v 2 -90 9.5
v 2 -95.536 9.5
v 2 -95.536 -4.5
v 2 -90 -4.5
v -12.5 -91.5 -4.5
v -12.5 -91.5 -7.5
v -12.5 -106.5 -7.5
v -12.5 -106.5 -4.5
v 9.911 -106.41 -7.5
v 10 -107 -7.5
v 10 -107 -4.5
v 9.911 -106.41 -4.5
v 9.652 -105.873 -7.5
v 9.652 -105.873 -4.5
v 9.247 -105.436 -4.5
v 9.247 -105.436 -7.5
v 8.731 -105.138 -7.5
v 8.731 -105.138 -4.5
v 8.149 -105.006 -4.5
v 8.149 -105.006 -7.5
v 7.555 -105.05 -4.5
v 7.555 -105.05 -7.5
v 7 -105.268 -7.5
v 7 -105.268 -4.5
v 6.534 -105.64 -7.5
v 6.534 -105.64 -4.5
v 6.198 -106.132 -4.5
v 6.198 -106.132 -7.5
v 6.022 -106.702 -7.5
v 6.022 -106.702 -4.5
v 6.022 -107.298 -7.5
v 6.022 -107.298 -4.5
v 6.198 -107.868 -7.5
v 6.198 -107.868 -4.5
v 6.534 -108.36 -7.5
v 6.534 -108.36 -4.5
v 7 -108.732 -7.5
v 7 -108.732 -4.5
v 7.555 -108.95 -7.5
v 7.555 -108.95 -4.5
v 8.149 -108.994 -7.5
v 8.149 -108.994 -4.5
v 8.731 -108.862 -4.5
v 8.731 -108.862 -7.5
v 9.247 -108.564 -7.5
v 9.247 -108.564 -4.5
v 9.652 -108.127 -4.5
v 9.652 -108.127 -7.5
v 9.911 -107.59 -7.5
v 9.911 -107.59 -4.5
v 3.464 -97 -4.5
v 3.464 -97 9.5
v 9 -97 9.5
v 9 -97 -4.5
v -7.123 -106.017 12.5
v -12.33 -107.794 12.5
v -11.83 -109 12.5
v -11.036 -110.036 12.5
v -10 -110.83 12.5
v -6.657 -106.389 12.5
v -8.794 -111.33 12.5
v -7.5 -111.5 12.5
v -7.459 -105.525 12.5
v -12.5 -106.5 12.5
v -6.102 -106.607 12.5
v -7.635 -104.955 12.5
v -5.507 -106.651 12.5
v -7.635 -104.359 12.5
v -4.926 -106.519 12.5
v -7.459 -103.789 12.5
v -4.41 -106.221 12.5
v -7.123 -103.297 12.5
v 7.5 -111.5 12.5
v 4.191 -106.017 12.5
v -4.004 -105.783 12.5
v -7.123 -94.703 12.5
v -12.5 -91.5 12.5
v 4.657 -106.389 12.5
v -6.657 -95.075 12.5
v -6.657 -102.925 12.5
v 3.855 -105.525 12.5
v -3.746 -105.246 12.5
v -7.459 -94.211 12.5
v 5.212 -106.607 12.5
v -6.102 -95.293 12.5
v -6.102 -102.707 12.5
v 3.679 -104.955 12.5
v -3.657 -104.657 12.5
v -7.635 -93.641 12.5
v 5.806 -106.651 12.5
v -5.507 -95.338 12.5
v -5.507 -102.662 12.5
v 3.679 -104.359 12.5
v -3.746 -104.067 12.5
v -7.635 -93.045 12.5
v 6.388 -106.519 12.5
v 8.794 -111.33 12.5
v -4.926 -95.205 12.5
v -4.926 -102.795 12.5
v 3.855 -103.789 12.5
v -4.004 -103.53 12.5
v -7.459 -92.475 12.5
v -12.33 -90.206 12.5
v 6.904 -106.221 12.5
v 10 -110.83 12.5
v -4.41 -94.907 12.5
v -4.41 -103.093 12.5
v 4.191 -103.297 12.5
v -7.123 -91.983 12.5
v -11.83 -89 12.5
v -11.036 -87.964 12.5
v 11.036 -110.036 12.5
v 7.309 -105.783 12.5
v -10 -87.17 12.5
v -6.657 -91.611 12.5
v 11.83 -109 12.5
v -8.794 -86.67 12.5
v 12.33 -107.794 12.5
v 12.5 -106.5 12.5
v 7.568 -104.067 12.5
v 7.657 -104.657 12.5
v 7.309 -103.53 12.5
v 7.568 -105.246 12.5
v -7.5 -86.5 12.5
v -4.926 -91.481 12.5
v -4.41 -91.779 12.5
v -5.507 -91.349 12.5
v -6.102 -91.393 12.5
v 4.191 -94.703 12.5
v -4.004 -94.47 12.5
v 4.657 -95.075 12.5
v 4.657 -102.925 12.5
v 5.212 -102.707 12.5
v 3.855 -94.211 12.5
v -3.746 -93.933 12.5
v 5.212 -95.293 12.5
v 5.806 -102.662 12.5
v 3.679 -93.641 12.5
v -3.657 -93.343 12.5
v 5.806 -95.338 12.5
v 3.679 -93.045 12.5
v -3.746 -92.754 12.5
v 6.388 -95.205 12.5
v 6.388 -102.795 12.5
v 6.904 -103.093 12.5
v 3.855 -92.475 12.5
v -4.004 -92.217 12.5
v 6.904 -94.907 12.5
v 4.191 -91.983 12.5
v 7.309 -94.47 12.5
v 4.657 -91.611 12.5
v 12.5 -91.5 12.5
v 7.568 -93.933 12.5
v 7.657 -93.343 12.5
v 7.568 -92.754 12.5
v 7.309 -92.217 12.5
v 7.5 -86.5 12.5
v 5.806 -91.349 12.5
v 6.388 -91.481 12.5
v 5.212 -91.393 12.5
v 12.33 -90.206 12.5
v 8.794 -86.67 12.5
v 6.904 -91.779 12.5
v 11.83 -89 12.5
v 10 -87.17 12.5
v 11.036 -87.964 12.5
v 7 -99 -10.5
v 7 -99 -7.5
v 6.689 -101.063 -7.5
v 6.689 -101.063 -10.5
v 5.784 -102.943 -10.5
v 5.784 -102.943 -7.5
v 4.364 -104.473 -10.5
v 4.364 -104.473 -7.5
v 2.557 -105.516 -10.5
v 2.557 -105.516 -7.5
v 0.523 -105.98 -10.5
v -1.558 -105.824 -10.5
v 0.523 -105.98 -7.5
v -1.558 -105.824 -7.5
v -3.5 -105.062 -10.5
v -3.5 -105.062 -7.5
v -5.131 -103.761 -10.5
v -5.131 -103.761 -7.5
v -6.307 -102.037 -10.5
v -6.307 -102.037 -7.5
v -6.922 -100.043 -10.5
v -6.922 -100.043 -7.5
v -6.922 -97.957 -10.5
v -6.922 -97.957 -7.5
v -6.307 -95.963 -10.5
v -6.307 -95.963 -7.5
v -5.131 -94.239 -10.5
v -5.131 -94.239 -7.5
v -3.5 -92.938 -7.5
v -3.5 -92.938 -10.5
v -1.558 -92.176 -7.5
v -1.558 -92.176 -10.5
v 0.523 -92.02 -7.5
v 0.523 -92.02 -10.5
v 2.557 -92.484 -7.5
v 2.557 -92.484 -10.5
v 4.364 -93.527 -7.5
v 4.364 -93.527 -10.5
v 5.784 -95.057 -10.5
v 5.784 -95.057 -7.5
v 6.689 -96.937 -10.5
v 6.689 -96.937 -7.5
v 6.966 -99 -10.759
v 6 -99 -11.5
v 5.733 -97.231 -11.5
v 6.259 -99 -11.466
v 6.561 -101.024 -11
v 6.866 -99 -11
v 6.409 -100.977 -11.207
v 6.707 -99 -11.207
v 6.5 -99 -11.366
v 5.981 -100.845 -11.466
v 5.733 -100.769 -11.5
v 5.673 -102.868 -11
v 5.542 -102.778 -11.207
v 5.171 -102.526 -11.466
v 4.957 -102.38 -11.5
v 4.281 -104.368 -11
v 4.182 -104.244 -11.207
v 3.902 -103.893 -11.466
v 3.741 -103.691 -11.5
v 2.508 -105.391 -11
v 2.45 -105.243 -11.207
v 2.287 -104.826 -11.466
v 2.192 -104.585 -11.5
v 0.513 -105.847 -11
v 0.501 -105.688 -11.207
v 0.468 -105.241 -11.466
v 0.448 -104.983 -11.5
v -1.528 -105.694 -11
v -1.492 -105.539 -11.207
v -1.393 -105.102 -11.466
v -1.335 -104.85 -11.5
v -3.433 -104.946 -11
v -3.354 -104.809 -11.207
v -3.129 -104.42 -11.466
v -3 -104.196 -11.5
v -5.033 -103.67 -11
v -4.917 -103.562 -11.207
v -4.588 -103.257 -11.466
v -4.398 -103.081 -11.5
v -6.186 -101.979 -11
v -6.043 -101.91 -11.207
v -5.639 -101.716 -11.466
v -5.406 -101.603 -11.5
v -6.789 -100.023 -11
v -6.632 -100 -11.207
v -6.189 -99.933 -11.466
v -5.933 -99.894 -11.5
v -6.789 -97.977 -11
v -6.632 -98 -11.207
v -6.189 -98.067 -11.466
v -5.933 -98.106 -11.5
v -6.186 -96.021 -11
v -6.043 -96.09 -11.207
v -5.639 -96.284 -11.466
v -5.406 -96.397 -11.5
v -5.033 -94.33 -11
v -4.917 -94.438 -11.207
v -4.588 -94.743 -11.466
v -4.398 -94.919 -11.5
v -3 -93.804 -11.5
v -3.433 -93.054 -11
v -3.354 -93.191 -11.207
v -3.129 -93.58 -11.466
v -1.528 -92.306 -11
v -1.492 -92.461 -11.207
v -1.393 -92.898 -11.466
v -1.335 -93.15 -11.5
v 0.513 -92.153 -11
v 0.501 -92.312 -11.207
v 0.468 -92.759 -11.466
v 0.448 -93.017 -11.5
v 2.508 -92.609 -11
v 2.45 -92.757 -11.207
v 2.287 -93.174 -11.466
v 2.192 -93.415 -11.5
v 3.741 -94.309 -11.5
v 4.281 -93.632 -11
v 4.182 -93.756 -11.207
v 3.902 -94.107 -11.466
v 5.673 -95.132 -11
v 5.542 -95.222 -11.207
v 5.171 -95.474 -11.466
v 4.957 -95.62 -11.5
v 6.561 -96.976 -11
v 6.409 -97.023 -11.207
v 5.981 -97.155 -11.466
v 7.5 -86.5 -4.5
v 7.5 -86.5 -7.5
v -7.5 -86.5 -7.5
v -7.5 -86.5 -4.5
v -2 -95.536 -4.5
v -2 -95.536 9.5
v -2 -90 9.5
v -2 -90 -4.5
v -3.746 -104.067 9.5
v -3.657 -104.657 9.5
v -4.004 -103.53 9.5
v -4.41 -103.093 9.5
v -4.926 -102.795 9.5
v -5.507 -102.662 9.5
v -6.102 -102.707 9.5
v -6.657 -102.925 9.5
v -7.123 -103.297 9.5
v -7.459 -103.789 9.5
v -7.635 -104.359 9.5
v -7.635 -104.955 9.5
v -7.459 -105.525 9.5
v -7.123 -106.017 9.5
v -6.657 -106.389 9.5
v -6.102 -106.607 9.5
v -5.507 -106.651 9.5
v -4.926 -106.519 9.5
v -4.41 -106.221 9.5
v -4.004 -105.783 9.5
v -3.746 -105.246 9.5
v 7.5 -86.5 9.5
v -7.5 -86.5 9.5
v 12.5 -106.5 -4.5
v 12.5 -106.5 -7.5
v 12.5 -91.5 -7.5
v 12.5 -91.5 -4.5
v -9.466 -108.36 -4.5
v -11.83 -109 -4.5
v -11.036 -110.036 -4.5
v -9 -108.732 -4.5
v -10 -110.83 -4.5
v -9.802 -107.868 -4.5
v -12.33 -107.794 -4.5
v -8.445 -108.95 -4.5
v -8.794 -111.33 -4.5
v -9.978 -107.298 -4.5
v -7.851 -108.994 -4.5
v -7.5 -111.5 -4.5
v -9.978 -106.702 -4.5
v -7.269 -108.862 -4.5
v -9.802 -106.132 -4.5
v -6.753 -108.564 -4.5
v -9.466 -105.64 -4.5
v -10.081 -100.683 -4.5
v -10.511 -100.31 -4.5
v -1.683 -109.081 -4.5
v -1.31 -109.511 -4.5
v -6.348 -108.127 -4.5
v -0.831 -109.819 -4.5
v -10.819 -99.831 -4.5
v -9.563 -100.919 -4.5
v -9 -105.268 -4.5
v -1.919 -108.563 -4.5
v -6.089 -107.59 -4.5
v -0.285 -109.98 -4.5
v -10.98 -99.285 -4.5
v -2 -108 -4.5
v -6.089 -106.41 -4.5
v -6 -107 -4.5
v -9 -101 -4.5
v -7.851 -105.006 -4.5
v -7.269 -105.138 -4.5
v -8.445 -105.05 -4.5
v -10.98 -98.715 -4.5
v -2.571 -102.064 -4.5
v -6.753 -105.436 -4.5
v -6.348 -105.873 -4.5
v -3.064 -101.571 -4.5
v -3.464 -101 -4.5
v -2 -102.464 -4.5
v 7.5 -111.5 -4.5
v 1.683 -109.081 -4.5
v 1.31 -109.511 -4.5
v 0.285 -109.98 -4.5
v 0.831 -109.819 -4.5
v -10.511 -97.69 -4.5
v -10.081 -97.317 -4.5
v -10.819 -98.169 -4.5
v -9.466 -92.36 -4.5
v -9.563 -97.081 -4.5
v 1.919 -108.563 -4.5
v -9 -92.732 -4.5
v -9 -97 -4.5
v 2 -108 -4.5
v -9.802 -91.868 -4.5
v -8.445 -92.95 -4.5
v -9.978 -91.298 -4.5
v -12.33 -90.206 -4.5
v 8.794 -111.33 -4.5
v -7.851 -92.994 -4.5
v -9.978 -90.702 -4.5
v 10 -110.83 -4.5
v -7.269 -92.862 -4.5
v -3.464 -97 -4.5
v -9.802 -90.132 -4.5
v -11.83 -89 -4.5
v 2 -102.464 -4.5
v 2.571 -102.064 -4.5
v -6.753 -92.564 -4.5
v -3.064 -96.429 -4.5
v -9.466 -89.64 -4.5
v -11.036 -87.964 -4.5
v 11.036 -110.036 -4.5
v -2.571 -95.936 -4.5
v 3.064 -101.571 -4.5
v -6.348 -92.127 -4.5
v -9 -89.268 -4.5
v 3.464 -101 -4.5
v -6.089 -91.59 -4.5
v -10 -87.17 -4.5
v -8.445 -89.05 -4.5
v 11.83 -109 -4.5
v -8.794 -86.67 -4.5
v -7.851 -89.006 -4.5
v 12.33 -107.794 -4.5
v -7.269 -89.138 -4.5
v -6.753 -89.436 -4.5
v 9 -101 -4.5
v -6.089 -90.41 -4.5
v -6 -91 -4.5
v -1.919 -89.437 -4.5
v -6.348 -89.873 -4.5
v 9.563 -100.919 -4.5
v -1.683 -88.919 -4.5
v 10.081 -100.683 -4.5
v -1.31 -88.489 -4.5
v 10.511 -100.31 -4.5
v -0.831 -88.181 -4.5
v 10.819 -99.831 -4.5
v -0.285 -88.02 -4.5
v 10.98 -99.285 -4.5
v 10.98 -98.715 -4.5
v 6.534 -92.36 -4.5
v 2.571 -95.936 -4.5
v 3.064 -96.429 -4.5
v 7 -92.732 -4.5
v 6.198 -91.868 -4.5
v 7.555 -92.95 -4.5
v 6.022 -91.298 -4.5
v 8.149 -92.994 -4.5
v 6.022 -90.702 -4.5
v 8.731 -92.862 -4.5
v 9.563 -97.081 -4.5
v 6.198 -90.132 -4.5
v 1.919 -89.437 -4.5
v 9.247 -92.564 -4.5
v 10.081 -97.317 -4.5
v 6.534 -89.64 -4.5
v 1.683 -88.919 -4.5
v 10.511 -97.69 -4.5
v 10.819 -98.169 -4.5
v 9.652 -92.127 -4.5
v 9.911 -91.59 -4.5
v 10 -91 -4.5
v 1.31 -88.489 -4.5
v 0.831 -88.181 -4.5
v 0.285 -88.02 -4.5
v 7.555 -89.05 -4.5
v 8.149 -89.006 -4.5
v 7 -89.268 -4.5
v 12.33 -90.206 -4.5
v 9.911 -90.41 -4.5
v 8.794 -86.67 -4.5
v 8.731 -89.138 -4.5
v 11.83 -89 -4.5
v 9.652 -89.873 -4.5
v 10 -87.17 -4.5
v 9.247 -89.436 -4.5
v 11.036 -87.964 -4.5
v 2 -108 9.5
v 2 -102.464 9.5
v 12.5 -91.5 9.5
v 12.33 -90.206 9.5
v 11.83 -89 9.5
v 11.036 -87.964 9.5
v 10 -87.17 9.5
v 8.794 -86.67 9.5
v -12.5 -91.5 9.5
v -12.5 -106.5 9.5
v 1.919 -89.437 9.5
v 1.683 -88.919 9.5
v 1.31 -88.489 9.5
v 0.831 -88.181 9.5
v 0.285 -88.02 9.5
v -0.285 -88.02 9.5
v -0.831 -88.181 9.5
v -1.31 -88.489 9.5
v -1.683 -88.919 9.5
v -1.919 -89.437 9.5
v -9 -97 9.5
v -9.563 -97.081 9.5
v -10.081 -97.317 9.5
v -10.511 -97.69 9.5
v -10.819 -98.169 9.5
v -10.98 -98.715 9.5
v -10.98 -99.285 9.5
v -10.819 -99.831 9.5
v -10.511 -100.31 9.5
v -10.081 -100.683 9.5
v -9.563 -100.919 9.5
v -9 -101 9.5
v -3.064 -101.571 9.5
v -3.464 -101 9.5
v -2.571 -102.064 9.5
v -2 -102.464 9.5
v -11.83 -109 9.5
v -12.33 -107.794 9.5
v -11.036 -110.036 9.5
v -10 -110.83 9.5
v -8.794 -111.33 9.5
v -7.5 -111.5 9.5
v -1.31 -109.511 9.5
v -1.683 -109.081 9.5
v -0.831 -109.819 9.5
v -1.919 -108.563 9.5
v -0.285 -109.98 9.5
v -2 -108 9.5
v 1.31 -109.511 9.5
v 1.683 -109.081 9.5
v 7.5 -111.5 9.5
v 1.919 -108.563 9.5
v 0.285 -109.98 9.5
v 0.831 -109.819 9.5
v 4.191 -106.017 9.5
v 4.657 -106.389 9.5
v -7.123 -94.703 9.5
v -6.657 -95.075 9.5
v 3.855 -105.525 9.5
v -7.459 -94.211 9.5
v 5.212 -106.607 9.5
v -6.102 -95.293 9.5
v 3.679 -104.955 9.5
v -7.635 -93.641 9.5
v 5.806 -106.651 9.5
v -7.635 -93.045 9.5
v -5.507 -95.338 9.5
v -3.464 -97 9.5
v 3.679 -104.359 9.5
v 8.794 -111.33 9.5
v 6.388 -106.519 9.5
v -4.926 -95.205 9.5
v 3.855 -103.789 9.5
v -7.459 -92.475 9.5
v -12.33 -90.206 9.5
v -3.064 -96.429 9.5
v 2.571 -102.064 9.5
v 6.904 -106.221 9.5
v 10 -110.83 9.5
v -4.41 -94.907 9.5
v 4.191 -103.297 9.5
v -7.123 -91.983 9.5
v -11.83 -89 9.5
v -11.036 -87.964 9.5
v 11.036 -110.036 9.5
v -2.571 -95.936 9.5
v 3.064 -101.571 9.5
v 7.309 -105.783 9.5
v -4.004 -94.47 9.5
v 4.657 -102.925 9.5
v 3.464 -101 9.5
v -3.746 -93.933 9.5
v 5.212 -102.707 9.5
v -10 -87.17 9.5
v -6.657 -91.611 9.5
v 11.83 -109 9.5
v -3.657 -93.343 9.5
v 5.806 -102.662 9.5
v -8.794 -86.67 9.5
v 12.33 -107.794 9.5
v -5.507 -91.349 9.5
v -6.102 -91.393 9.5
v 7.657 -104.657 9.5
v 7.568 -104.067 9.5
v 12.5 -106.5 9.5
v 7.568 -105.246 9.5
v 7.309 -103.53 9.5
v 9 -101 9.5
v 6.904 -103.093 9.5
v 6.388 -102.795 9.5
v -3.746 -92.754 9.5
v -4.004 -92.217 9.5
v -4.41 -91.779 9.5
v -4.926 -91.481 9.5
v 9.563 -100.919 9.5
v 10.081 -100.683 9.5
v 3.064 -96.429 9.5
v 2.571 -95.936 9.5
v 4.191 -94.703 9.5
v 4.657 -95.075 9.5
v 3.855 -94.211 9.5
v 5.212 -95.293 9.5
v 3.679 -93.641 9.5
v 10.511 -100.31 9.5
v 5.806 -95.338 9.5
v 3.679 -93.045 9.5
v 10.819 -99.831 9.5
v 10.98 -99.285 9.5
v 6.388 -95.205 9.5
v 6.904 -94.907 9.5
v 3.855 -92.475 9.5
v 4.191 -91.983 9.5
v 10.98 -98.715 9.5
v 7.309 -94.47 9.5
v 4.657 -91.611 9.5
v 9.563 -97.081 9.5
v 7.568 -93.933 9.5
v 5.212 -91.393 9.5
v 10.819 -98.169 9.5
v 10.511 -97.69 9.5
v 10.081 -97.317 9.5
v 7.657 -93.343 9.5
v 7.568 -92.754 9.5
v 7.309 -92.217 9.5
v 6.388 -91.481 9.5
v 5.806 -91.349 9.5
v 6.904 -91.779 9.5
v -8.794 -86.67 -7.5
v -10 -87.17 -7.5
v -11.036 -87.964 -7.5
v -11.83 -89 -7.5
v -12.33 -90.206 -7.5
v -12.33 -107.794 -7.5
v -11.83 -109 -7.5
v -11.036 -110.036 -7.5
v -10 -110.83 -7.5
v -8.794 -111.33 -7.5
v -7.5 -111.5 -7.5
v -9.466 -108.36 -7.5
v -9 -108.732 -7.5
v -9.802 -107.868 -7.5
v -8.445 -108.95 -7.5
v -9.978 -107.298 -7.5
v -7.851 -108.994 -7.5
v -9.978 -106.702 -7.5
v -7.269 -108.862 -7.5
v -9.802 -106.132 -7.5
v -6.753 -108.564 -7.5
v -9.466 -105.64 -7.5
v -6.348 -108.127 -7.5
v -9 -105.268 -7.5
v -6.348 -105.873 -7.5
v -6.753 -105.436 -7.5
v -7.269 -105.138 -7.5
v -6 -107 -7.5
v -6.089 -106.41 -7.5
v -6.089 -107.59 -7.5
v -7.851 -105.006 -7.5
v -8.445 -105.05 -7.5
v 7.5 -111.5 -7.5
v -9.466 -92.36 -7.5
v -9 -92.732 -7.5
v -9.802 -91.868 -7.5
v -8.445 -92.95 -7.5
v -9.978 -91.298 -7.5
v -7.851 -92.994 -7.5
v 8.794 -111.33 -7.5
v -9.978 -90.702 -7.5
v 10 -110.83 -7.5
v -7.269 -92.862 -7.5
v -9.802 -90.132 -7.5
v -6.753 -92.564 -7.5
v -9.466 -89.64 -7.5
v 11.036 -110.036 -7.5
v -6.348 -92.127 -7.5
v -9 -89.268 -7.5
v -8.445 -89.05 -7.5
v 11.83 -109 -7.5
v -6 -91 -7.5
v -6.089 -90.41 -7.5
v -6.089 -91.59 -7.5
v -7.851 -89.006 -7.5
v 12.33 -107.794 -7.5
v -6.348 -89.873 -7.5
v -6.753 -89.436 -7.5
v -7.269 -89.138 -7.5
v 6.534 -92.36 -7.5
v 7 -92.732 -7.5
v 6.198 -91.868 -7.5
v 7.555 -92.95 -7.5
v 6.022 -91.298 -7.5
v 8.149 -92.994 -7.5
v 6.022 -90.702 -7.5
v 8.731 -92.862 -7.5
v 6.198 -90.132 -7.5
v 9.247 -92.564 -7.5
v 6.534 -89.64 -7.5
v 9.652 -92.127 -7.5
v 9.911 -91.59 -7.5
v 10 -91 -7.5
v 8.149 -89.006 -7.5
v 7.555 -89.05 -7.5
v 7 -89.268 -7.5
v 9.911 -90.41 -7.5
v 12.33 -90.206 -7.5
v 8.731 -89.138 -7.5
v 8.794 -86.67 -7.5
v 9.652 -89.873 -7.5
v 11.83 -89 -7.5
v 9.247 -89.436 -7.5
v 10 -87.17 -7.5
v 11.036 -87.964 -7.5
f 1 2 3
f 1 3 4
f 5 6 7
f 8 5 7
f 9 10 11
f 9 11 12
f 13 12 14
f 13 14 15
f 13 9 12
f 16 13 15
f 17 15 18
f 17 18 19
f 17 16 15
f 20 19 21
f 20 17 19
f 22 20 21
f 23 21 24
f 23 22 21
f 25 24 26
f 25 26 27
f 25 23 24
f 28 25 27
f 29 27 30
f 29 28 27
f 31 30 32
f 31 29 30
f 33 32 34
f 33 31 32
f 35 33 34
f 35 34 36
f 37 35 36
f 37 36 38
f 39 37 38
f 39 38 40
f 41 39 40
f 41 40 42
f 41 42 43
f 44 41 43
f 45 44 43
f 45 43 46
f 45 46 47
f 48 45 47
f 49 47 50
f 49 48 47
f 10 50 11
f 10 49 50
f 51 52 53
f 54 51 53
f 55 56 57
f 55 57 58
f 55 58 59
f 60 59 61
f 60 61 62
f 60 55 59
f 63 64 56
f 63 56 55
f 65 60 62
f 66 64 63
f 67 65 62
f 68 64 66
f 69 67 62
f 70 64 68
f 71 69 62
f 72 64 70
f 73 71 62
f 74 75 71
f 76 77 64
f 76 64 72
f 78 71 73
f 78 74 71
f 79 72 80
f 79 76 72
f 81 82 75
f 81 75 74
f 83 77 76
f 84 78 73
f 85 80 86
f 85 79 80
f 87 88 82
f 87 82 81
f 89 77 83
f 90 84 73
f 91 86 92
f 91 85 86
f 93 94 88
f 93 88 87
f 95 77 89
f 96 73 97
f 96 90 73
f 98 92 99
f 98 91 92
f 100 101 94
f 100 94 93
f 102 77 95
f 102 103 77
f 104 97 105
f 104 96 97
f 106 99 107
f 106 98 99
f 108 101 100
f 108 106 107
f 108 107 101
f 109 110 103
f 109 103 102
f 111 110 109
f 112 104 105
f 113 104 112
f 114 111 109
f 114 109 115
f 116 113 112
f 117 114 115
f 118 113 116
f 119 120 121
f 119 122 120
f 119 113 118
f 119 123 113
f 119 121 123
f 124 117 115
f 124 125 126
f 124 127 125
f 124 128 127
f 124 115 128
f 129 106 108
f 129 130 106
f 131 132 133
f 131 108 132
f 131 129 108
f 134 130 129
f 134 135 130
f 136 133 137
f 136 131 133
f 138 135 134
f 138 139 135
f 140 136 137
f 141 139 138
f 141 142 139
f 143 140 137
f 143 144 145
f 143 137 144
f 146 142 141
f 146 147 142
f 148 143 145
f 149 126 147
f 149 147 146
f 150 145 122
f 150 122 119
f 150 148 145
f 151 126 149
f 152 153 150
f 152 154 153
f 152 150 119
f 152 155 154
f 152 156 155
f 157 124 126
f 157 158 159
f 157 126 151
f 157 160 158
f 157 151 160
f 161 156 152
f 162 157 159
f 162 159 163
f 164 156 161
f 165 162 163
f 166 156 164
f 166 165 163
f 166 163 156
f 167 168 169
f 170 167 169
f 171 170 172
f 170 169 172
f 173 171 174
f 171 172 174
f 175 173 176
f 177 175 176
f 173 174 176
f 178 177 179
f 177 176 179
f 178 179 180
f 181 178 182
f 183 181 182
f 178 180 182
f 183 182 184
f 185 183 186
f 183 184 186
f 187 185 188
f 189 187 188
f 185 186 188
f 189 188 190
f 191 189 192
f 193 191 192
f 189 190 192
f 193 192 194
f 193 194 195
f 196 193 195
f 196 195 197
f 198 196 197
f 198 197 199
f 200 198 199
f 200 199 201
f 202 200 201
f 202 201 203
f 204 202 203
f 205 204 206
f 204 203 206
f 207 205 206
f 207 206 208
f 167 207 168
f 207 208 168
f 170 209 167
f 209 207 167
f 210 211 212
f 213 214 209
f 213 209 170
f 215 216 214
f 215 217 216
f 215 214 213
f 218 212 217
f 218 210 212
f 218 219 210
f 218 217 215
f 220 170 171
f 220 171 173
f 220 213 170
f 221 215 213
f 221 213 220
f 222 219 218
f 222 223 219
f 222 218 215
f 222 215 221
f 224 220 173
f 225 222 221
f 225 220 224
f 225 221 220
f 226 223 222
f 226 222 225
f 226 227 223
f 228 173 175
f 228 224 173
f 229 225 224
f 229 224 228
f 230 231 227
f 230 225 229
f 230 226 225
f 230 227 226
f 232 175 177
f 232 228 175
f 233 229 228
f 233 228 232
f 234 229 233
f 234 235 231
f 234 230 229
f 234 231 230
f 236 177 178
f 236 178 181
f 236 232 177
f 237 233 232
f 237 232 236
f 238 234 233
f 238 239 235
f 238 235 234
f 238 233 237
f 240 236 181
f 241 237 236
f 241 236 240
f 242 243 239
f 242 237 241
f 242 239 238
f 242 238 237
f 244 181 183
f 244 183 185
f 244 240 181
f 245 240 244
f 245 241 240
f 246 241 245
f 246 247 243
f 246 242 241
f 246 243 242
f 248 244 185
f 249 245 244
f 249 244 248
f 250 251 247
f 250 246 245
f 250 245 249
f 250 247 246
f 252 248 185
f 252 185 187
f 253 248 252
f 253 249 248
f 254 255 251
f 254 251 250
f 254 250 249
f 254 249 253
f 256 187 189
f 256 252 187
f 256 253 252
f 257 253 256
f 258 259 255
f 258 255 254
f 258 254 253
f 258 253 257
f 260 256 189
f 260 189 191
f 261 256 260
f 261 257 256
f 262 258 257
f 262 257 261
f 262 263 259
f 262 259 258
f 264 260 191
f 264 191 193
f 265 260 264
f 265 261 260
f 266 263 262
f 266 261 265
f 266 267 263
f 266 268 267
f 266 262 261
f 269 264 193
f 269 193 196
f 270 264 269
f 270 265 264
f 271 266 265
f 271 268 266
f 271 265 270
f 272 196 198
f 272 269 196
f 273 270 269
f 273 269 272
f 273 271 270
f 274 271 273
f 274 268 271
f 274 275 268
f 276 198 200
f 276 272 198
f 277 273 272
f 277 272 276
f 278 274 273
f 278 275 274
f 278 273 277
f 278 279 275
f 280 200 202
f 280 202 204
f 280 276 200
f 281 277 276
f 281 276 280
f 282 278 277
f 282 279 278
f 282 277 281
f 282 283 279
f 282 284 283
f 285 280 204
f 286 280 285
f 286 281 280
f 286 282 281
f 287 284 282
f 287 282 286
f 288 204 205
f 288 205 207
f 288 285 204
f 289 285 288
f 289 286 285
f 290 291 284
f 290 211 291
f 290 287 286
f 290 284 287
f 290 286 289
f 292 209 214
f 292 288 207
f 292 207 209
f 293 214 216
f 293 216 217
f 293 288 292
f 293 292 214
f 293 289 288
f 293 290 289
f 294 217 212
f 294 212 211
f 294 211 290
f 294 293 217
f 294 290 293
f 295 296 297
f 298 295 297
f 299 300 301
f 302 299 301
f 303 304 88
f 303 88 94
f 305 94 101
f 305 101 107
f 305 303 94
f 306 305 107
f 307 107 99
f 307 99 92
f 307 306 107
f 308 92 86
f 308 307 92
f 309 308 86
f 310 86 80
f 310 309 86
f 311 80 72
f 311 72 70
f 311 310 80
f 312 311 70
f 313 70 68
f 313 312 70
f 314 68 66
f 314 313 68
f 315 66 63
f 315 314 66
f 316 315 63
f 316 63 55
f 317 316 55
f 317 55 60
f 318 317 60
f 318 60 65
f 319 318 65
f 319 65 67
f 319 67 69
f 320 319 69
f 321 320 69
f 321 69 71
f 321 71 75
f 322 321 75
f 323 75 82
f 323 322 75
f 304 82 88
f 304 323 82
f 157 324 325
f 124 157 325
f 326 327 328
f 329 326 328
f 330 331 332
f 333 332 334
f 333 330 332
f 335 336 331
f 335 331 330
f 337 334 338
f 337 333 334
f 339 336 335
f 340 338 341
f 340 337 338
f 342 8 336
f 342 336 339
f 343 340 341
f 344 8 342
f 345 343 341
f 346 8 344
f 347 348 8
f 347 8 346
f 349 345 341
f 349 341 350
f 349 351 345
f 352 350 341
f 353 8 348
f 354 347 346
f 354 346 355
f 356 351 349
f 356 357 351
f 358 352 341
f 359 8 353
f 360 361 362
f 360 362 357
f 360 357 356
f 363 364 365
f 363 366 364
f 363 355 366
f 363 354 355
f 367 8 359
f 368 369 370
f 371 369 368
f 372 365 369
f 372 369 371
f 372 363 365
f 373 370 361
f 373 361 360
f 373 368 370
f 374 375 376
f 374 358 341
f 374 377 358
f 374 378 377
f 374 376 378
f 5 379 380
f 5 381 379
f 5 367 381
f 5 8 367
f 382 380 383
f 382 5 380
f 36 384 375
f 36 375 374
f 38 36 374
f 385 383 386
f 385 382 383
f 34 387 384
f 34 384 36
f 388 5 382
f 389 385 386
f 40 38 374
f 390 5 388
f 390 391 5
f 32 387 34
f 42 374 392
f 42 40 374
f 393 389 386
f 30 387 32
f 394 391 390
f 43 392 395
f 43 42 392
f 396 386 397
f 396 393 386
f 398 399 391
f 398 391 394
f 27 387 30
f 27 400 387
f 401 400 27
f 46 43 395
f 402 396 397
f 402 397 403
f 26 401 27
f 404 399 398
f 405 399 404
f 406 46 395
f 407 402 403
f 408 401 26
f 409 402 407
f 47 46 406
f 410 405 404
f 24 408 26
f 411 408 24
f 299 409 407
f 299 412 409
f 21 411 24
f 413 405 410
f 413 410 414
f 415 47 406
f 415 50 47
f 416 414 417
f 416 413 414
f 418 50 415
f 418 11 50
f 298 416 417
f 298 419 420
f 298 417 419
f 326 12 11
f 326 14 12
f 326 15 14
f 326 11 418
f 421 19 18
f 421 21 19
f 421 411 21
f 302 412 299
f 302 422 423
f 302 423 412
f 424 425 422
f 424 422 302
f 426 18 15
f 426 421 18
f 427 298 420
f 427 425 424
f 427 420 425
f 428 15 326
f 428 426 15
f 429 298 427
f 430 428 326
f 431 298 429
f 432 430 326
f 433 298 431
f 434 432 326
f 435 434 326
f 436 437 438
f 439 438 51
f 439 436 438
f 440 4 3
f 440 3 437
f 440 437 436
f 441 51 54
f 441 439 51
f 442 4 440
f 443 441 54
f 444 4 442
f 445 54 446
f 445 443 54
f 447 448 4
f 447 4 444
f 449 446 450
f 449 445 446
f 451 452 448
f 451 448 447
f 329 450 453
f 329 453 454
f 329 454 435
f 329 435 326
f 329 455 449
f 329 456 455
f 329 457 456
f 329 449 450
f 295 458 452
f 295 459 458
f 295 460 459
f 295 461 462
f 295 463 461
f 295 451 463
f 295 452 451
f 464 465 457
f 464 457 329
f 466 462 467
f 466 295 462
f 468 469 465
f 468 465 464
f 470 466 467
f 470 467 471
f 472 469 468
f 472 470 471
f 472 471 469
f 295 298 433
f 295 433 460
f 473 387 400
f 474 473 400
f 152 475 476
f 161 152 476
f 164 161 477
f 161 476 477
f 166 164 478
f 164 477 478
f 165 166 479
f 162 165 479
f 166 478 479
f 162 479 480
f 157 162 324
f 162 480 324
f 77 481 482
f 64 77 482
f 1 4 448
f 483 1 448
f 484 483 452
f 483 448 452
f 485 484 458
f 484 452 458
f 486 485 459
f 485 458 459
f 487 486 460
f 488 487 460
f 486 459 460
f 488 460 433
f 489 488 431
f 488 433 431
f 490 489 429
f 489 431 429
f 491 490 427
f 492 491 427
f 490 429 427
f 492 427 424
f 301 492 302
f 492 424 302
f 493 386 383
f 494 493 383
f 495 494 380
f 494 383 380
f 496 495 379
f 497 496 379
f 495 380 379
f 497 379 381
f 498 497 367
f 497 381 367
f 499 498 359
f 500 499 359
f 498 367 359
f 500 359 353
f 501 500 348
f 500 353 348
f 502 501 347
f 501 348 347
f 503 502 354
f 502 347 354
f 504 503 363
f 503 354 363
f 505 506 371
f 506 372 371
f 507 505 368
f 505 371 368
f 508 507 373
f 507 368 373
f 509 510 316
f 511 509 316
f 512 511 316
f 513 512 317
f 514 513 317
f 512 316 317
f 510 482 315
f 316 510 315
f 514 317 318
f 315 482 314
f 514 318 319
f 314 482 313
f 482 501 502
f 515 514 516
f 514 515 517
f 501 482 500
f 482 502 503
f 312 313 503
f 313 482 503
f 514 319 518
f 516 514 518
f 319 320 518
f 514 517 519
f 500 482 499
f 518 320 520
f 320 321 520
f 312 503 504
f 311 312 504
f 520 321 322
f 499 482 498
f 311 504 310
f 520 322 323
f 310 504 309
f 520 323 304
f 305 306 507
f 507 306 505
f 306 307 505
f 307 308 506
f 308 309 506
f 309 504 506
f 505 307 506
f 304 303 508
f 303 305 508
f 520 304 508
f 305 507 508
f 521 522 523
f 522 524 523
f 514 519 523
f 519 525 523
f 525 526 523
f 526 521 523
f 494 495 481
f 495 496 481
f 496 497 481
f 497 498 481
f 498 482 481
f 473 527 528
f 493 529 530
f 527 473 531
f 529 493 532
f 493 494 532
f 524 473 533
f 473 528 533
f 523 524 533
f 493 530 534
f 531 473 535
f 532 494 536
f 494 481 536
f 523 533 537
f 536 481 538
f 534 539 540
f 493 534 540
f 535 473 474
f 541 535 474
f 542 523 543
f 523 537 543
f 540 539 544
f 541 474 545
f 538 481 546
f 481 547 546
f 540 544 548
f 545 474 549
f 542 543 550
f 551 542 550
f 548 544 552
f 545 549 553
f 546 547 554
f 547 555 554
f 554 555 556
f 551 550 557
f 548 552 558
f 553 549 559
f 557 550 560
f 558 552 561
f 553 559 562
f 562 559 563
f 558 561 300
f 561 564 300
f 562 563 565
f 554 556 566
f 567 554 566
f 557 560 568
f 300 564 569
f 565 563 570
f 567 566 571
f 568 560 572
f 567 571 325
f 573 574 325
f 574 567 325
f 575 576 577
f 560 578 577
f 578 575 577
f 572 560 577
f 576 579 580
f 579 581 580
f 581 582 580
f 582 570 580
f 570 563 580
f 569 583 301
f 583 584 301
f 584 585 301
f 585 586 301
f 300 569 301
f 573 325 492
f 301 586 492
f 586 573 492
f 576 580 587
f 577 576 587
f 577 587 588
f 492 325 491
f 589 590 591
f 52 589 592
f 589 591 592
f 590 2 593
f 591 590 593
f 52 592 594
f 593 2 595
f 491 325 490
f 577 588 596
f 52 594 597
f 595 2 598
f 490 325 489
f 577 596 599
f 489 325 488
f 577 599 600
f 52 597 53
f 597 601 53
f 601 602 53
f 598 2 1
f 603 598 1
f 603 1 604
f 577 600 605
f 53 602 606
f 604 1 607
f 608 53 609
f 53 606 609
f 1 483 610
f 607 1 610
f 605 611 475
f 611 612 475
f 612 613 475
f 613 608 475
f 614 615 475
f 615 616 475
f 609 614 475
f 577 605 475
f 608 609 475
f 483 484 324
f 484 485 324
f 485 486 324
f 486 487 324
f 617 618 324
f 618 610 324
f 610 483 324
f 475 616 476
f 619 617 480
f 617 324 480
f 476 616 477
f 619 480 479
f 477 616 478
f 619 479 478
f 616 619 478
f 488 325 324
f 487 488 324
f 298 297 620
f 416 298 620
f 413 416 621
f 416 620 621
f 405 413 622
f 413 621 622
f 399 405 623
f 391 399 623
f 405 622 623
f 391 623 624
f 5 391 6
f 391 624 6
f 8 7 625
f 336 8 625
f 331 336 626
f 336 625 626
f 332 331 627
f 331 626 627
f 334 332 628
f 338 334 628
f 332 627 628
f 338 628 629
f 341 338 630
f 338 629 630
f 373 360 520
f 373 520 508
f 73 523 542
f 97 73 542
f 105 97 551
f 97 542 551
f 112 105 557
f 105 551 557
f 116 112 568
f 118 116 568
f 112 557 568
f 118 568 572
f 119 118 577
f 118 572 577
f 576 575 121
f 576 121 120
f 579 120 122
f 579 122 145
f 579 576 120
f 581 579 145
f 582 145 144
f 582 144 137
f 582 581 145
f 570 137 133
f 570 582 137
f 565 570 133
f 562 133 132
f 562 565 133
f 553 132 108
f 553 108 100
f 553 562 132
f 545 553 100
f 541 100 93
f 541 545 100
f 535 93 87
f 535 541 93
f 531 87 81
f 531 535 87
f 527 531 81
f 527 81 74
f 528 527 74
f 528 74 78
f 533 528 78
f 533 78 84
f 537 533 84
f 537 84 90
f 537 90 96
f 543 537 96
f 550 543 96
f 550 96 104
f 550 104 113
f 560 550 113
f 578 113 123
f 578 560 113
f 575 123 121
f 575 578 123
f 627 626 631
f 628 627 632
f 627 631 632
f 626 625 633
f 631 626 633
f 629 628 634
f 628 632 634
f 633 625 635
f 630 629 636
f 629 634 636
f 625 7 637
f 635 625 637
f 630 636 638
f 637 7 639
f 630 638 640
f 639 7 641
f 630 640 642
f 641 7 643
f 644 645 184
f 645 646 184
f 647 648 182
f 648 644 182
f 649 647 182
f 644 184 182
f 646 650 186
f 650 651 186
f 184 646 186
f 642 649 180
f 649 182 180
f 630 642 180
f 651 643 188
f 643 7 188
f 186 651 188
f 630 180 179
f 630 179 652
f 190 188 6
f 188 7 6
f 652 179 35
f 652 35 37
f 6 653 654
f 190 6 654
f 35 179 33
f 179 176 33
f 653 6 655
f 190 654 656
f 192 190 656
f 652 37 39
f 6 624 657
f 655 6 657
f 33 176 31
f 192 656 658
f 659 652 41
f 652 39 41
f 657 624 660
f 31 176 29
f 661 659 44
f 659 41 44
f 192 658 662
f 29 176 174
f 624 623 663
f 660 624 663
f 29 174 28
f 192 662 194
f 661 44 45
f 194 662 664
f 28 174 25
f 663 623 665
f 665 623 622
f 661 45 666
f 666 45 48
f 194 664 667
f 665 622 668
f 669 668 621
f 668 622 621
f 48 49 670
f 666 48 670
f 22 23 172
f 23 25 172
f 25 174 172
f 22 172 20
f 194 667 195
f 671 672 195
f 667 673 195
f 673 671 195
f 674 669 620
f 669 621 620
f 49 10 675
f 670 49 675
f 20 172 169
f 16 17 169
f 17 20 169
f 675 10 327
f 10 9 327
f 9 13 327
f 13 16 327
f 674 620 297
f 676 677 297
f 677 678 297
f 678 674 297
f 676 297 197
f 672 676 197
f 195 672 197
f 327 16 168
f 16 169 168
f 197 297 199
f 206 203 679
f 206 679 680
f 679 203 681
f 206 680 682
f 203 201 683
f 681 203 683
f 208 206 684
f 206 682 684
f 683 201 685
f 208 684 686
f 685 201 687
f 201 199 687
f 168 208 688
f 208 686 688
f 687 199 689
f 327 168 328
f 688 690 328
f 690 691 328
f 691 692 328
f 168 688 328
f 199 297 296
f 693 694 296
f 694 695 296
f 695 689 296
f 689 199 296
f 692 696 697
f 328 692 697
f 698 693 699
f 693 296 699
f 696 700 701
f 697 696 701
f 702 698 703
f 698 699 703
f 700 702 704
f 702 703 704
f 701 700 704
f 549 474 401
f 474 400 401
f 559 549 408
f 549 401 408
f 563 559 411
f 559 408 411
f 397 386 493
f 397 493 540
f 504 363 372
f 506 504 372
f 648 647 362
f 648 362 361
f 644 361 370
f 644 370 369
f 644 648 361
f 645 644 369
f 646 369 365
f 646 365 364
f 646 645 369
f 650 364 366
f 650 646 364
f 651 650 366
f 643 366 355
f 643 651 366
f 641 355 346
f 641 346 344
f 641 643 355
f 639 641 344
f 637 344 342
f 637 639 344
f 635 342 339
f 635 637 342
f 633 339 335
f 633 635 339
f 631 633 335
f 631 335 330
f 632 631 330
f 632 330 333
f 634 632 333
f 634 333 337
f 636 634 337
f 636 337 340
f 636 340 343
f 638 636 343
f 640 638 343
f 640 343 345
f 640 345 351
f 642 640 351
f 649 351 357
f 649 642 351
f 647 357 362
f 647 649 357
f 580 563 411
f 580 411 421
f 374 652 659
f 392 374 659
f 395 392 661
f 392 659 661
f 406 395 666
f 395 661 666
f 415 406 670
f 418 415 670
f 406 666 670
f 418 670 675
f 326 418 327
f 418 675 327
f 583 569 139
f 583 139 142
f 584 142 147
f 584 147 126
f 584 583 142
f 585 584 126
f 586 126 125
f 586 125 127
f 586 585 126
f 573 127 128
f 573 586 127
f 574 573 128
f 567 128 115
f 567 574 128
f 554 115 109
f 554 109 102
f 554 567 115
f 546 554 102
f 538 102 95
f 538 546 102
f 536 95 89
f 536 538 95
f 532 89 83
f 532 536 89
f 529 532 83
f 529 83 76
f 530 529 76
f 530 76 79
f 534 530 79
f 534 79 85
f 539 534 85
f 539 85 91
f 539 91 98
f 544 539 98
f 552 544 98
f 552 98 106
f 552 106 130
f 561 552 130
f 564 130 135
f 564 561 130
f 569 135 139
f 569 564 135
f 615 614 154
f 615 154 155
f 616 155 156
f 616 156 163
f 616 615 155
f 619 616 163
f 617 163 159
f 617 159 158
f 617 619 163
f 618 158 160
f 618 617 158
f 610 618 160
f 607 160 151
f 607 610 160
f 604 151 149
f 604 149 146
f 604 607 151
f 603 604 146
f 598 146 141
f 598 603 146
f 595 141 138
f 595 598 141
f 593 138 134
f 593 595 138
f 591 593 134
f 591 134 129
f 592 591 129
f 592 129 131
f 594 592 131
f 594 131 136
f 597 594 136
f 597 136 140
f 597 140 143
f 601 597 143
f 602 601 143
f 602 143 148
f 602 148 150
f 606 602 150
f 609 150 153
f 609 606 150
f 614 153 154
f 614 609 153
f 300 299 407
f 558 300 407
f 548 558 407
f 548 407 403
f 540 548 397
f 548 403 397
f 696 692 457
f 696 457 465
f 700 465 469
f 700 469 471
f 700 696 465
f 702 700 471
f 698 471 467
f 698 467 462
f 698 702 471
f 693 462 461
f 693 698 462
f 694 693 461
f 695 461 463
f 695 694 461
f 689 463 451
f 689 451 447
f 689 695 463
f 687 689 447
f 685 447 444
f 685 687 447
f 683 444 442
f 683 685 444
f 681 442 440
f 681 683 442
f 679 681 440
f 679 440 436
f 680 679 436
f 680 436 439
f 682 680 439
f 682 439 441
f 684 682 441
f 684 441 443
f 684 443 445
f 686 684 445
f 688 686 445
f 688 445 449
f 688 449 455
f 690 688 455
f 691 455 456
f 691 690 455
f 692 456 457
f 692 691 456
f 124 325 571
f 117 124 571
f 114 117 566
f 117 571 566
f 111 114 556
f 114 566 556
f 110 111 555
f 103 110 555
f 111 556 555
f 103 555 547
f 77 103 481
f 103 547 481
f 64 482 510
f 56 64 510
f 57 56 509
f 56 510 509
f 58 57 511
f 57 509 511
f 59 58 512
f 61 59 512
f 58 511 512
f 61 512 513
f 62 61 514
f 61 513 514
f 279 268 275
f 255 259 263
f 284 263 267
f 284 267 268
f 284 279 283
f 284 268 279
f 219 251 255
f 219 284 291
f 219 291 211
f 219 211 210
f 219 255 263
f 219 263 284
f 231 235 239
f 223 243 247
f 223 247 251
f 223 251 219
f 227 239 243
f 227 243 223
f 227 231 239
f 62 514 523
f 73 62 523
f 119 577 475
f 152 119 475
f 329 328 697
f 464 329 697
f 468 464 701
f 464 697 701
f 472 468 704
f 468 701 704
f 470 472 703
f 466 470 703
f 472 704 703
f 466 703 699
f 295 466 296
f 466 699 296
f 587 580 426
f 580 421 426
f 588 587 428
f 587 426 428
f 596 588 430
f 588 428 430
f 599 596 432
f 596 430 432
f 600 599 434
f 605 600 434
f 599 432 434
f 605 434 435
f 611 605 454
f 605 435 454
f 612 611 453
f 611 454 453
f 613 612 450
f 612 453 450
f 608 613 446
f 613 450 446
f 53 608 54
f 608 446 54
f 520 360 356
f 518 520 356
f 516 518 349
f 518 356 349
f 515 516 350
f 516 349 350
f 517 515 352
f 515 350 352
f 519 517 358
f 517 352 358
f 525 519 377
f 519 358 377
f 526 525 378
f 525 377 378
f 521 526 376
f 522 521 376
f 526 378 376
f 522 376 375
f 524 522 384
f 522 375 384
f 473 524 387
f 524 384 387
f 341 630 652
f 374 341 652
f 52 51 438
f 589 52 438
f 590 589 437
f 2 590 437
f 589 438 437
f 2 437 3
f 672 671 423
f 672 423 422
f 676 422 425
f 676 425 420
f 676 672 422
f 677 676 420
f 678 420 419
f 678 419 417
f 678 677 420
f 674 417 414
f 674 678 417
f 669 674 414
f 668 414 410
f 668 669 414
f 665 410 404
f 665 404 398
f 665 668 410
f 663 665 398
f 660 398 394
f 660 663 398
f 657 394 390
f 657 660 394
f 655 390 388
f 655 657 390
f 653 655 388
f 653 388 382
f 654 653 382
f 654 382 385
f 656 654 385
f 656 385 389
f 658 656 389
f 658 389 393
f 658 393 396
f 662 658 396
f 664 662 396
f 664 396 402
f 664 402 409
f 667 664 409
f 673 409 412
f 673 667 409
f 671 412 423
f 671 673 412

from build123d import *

# Parameters (mm, degrees)
SKETCH028_R   = 2
PAD018_DEPTH  = 3
SKETCH005_R   = 7
PAD003_DEPTH  = 4
FILLET_R      = 1
SKETCH029_R   = 4
SKETCH029_R_2 = 2
PAD019_DEPTH  = 14
SKETCH030_R   = 2
PAD020_DEPTH  = 3
SKETCH031_W   = 18
SKETCH031_H   = 4
PAD021_DEPTH  = 14
SKETCH032_W   = 4
SKETCH032_H   = 18
PAD022_DEPTH  = 14


with BuildPart() as part:
    # Sketch028 (on Face1 of CopySolid004) → Pad018 (new body)
    with BuildSketch(Plane.XY.offset(-16)):
        with BuildLine():
            Line((-7.5, -12.5), (7.5, -12.5))
            ThreePointArc((7.5, -12.5), (11.035534, -11.035534), (12.5, -7.5))
            Line((12.5, -7.5), (12.5, 7.5))
            ThreePointArc((12.5, 7.5), (11.035534, 11.035534), (7.5, 12.5))
            Line((7.5, 12.5), (-7.5, 12.5))
            ThreePointArc((-7.5, 12.5), (-11.035534, 11.035534), (-12.5, 7.5))
            Line((-12.5, 7.5), (-12.5, -7.5))
            ThreePointArc((-12.5, -7.5), (-11.035534, -11.035534), (-7.5, -12.5))
        make_face()
        with Locations((-8, 8)):
            Circle(SKETCH028_R, mode=Mode.SUBTRACT)
        with Locations((8, 8)):
            Circle(SKETCH028_R, mode=Mode.SUBTRACT)
        with Locations((8, -8)):
            Circle(SKETCH028_R, mode=Mode.SUBTRACT)
        with Locations((-8, -8)):
            Circle(SKETCH028_R, mode=Mode.SUBTRACT)
    extrude(amount=PAD018_DEPTH)

    # Sketch005 (on Face13 of Pad018) → Pad003 (join)
    with BuildSketch(Plane(origin=(0, 0, -16), x_dir=(1, 0, 0), z_dir=(0, 0, -1))):
        Circle(SKETCH005_R)
    extrude(amount=PAD003_DEPTH)

    # Fillet
    fillet_edges = [part.edges().sort_by_distance(p)[0] for p in [
        (-7, 0, -20),
    ]]
    fillet(fillet_edges, radius=FILLET_R)

    # Sketch029 (on Face17 of Fillet) → Pad019 (join)
    with BuildSketch(Plane.XY.offset(-13)):
        Circle(SKETCH029_R)
        with Locations((0, 9)):
            Circle(SKETCH029_R_2)
        with Locations((9, 0)):
            Circle(SKETCH029_R_2)
        with Locations((0, -9)):
            Circle(SKETCH029_R_2)
        with Locations((-9, 0)):
            Circle(SKETCH029_R_2)
    extrude(amount=PAD019_DEPTH)

    # Sketch030 (on Face25 of Pad019) → Pad020 (join)
    with BuildSketch(Plane.XY.offset(1)):
        with BuildLine():
            Line((-7.5, -12.5), (7.5, -12.5))
            ThreePointArc((7.5, -12.5), (11.035534, -11.035534), (12.5, -7.5))
            Line((12.5, -7.5), (12.5, 7.5))
            ThreePointArc((12.5, 7.5), (11.035534, 11.035534), (7.5, 12.5))
            Line((7.5, 12.5), (-7.5, 12.5))
            ThreePointArc((-7.5, 12.5), (-11.035534, 11.035534), (-12.5, 7.5))
            Line((-12.5, 7.5), (-12.5, -7.5))
            ThreePointArc((-12.5, -7.5), (-11.035534, -11.035534), (-7.5, -12.5))
        make_face()
        with Locations((-5.656851, 5.656857)):
            Circle(SKETCH030_R, mode=Mode.SUBTRACT)
        with Locations((5.656855, 5.656853)):
            Circle(SKETCH030_R, mode=Mode.SUBTRACT)
        with Locations((5.656855, -5.656853)):
            Circle(SKETCH030_R, mode=Mode.SUBTRACT)
        with Locations((-5.656851, -5.656857)):
            Circle(SKETCH030_R, mode=Mode.SUBTRACT)
    extrude(amount=PAD020_DEPTH)

    # Sketch031 (on Face17 of Pad020) → Pad021 (join)
    with BuildSketch(Plane.XY.offset(-13)):
        Rectangle(SKETCH031_W, SKETCH031_H)
    extrude(amount=PAD021_DEPTH)

    # Sketch032 (on Face17 of Pad021) → Pad022 (join)
    with BuildSketch(Plane.XY.offset(-13)):
        Rectangle(SKETCH032_W, SKETCH032_H)
    extrude(amount=PAD022_DEPTH)


with BuildPart() as part_1:
    # Body010 placement: moved
    add(part.part.moved(Location((0, -99, 8.5))))


solid = part_1.part
